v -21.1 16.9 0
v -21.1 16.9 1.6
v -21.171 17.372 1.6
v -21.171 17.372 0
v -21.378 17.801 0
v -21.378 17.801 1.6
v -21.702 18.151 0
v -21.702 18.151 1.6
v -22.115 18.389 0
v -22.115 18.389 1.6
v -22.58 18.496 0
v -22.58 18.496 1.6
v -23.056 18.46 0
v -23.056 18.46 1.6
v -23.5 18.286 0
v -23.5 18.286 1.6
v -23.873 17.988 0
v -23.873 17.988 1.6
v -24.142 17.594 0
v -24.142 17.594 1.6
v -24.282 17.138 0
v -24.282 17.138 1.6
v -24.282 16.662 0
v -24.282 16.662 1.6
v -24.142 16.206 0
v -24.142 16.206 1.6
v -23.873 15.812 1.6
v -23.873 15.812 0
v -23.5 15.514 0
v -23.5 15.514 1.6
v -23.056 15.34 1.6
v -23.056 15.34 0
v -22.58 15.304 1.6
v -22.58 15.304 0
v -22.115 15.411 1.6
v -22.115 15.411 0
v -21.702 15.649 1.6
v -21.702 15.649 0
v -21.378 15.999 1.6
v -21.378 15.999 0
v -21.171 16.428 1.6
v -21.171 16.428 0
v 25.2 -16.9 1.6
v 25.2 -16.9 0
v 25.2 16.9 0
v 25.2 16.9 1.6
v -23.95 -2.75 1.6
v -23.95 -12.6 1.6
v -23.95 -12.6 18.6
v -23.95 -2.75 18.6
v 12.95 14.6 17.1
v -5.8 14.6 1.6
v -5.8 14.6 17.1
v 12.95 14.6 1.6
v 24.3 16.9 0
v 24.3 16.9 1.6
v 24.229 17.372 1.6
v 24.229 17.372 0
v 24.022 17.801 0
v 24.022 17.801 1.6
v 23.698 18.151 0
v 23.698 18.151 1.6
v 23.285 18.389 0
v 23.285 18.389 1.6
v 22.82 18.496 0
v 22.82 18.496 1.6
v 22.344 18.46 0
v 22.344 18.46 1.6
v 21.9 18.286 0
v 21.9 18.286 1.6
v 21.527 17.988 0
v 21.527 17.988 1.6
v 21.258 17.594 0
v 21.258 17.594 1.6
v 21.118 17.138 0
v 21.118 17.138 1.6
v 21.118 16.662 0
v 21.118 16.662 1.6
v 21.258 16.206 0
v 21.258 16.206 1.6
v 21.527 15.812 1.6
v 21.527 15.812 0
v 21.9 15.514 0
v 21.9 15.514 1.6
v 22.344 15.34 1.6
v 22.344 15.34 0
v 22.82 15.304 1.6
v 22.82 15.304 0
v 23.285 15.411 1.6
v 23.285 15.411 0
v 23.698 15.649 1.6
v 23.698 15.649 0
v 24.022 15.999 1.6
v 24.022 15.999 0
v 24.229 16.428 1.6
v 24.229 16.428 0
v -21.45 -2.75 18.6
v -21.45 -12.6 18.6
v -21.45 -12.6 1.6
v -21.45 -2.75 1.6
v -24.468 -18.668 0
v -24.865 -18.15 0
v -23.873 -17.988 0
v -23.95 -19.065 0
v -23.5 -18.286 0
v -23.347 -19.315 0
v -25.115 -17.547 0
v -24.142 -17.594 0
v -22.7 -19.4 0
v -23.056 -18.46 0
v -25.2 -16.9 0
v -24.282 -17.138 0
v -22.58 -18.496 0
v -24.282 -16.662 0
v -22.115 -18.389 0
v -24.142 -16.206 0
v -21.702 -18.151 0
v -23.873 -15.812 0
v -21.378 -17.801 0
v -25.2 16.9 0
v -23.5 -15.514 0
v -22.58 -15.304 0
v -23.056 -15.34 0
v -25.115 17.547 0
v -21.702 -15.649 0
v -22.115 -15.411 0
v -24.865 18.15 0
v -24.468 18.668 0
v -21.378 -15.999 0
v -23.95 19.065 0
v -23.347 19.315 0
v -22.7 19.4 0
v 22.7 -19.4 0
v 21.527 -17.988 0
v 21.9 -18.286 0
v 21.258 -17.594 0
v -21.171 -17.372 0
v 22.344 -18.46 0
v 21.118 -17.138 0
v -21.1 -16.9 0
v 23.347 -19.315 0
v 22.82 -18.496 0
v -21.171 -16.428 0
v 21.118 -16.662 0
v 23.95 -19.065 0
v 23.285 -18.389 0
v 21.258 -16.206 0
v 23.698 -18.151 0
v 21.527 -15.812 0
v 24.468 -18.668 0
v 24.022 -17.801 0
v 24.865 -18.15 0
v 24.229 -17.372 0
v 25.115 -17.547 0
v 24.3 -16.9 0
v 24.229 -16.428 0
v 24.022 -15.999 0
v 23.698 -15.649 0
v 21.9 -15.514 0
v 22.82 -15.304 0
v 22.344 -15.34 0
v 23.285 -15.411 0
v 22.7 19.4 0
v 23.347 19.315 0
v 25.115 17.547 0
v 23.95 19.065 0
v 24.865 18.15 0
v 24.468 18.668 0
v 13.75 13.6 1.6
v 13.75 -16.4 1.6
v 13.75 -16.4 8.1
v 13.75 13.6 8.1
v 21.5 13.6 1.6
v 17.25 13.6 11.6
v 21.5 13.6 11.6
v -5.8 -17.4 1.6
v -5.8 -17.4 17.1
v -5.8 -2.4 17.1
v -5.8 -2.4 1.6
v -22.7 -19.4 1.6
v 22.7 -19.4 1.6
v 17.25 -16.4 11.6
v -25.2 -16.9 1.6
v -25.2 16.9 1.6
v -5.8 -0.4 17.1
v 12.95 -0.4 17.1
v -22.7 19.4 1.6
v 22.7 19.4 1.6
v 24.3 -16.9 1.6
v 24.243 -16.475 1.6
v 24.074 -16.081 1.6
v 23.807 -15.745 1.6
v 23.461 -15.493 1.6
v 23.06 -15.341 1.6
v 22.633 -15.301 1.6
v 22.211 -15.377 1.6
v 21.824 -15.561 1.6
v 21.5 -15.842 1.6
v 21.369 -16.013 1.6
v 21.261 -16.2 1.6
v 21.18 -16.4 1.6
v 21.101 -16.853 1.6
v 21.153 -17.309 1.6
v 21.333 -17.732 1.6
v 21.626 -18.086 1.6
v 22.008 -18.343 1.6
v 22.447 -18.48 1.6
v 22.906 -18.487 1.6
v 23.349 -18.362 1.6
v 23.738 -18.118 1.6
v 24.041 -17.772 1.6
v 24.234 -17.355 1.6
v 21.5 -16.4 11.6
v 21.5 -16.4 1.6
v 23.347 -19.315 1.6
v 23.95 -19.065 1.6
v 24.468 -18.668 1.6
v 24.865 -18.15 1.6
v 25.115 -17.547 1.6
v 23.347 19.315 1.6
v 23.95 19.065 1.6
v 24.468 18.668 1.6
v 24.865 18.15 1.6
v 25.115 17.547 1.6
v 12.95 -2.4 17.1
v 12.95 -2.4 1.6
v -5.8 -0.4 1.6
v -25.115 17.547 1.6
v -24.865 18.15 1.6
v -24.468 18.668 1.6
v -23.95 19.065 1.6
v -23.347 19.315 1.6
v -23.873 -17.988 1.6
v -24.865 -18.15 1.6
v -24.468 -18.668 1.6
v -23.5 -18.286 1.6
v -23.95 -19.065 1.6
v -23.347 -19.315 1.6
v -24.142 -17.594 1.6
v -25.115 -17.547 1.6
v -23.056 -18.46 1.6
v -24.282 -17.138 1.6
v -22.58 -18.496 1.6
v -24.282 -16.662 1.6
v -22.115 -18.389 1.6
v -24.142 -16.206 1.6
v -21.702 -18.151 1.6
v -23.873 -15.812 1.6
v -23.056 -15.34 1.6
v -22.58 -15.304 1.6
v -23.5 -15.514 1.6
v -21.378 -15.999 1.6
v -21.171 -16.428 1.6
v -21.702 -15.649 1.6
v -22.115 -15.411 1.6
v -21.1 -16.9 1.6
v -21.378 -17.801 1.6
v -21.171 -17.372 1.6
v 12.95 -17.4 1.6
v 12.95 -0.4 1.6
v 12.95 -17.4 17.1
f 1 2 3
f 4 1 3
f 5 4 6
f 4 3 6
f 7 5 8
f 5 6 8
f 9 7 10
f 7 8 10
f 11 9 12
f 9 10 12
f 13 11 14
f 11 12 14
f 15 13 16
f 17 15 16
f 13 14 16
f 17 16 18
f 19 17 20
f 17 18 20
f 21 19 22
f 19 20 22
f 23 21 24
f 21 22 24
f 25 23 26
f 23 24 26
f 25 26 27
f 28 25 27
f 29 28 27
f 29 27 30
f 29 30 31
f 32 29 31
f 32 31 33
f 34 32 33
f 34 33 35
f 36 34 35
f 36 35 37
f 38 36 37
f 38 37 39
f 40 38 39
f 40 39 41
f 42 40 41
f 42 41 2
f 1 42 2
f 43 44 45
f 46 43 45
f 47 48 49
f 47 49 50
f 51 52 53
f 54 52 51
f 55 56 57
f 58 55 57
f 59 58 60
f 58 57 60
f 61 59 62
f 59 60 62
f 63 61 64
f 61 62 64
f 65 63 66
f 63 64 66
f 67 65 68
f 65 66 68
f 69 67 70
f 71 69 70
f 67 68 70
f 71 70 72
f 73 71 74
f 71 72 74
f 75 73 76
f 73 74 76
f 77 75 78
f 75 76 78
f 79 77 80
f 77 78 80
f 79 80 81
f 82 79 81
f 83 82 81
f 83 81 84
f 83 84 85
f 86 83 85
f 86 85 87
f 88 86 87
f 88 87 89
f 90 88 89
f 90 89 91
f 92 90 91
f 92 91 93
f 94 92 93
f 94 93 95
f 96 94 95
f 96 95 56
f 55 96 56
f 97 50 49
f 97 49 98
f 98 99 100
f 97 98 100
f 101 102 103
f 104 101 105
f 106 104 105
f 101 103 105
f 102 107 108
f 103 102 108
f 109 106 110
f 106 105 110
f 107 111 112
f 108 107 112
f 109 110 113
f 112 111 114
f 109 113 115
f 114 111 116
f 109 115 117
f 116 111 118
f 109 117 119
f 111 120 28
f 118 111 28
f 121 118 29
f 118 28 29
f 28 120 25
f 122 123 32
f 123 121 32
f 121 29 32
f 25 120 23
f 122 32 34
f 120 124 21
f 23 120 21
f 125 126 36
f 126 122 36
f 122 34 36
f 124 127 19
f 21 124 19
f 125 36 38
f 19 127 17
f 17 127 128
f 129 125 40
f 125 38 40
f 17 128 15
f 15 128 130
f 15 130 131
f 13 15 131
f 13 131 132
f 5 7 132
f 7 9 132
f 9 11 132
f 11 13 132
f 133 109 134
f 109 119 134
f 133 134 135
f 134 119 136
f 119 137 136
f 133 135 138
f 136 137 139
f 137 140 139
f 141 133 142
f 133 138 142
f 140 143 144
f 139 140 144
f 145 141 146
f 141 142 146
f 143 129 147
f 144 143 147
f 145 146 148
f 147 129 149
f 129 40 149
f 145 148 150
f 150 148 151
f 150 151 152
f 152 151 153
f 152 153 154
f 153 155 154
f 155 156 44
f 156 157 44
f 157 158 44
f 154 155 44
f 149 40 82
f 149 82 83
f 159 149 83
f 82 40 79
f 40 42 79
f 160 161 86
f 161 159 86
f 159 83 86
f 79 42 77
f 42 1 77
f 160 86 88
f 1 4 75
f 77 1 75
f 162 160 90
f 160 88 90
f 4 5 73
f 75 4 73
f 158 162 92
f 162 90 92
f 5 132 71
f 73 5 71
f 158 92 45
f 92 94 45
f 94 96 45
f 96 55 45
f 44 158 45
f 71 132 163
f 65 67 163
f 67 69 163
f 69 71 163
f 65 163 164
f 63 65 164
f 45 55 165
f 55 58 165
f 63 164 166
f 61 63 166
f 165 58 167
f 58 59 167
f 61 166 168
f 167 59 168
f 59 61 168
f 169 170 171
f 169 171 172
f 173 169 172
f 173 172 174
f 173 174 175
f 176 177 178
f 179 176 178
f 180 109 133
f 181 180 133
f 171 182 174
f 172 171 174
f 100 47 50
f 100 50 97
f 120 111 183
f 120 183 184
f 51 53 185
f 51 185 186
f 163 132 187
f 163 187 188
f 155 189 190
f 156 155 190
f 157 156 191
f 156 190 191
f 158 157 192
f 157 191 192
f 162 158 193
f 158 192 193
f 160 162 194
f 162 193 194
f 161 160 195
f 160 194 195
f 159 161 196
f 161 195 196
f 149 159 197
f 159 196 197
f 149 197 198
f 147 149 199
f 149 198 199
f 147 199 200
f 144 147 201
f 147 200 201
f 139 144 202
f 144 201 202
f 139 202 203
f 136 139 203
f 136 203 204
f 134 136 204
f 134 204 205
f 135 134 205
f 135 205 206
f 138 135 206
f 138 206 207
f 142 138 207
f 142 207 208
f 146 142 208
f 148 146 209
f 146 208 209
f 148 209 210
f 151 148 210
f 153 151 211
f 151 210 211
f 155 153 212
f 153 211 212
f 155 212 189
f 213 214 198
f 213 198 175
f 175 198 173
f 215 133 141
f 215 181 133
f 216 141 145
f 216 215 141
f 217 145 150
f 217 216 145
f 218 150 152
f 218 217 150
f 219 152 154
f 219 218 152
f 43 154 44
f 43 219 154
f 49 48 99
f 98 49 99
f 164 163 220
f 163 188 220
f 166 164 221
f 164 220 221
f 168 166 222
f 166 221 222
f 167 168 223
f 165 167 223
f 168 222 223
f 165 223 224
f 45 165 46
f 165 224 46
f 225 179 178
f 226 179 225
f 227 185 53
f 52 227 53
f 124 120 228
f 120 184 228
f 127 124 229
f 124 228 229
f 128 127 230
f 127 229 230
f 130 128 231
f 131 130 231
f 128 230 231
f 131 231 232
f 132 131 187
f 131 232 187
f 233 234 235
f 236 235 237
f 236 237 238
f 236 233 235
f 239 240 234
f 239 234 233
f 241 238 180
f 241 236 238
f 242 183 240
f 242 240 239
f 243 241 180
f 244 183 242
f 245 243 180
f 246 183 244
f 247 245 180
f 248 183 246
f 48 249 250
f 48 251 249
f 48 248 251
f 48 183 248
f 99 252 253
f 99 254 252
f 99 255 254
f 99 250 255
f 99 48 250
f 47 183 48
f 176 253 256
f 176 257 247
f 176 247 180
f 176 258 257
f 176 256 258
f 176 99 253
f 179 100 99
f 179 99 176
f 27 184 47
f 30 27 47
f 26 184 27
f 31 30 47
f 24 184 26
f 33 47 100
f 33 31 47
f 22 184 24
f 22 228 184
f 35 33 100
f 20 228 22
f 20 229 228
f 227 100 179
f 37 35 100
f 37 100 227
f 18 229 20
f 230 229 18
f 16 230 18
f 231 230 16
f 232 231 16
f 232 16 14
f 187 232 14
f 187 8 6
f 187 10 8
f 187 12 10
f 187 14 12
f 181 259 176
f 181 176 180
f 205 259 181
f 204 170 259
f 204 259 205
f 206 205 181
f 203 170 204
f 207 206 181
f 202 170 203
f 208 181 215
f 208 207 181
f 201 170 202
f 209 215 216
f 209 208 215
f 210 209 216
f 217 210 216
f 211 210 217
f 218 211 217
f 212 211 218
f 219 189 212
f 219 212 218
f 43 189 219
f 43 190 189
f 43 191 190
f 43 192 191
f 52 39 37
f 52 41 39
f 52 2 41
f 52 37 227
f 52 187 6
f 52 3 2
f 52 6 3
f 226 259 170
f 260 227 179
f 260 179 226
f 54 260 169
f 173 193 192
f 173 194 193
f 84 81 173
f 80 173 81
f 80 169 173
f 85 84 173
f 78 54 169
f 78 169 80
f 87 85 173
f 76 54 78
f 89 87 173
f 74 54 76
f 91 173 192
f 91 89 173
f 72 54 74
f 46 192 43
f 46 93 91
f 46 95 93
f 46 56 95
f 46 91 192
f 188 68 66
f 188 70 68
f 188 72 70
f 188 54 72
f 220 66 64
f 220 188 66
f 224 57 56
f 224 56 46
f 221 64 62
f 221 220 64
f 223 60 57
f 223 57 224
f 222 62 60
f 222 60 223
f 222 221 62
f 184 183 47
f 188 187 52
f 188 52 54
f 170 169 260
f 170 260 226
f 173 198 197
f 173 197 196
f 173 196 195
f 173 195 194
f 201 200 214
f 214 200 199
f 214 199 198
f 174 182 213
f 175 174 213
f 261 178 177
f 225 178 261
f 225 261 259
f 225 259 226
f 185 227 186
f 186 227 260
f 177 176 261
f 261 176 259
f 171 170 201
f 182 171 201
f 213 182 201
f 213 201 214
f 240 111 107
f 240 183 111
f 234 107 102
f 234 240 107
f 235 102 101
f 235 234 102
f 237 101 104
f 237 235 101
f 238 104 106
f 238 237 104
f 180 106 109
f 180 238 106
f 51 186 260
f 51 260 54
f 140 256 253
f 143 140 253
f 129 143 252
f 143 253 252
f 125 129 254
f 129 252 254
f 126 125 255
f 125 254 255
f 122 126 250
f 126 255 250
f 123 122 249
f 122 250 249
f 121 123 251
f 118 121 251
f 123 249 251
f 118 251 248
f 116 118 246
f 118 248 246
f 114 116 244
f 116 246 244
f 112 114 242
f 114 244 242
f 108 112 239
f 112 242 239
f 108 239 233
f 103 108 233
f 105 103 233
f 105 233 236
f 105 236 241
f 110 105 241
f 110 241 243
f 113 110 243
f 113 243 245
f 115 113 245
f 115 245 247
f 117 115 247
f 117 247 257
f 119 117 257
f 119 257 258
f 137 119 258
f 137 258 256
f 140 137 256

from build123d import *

# Parameters (mm, degrees)
F0_W      = 50.4
F0_H      = 38.8
F1_DEPTH  = 1.6
F2_W      = 18.75
F2_H      = 15
F3_DEPTH  = 15.5
F4_W      = 7.75
F4_H      = 30
F5_DEPTH  = 10
F6_SIZE2  = 3.5
F6_SIZE   = 3.5
F7_W      = 2.5
F7_H      = 9.85
F8_DEPTH  = 17
F9_R      = 2.5
F10_R     = 1.6
F11_DEPTH = 1.601


with BuildPart() as f1:
    # F0 (on Top) → F1 (new body)
    with BuildSketch(Plane.XY):
        Rectangle(F0_W, F0_H)
    extrude(amount=F1_DEPTH)

    # F2 (on face) → F3 (join)
    with BuildSketch(Plane.XY.offset(1.6)):
        with Locations((3.575, -9.9)):
            Rectangle(F2_W, F2_H)
        with Locations((3.575, 7.1)):
            Rectangle(F2_W, F2_H)
    extrude(amount=F3_DEPTH)

    # F4 (on face) → F5 (join)
    with BuildSketch(Plane.XY.offset(1.6)):
        with Locations((17.625, -1.4)):
            Rectangle(F4_W, F4_H)
    extrude(amount=F5_DEPTH)

    # F6
    f6_edges = [f1.edges().sort_by_distance(p)[0] for p in [
        (13.75, -1.4, 11.6),
    ]]
    chamfer(f6_edges, length=F6_SIZE, length2=F6_SIZE2)

    # F7 (on face) → F8 (join)
    with BuildSketch(Plane.XY.offset(1.6)):
        with Locations((-22.7, -7.675)):
            Rectangle(F7_W, F7_H)
    extrude(amount=F8_DEPTH)

    # F9
    f9_edges = [f1.edges().sort_by_distance(p)[0] for p in [
        (-25.2, 19.4, 0.8),
        (25.2, 19.4, 0.8),
        (25.2, -19.4, 0.8),
        (-25.2, -19.4, 0.8),
    ]]
    fillet(f9_edges, radius=F9_R)

    # F10 (on face) → F11 (cut, through all)
    with BuildSketch(Plane.XY.offset(1.6)):
        with Locations((-22.7, 16.9)):
            Circle(F10_R)
        with Locations((22.7, 16.9)):
            Circle(F10_R)
        with Locations((22.7, -16.9)):
            Circle(F10_R)
        with Locations((-22.7, -16.9)):
            Circle(F10_R)
    extrude(amount=-F11_DEPTH, mode=Mode.SUBTRACT)


solid = f1.part
